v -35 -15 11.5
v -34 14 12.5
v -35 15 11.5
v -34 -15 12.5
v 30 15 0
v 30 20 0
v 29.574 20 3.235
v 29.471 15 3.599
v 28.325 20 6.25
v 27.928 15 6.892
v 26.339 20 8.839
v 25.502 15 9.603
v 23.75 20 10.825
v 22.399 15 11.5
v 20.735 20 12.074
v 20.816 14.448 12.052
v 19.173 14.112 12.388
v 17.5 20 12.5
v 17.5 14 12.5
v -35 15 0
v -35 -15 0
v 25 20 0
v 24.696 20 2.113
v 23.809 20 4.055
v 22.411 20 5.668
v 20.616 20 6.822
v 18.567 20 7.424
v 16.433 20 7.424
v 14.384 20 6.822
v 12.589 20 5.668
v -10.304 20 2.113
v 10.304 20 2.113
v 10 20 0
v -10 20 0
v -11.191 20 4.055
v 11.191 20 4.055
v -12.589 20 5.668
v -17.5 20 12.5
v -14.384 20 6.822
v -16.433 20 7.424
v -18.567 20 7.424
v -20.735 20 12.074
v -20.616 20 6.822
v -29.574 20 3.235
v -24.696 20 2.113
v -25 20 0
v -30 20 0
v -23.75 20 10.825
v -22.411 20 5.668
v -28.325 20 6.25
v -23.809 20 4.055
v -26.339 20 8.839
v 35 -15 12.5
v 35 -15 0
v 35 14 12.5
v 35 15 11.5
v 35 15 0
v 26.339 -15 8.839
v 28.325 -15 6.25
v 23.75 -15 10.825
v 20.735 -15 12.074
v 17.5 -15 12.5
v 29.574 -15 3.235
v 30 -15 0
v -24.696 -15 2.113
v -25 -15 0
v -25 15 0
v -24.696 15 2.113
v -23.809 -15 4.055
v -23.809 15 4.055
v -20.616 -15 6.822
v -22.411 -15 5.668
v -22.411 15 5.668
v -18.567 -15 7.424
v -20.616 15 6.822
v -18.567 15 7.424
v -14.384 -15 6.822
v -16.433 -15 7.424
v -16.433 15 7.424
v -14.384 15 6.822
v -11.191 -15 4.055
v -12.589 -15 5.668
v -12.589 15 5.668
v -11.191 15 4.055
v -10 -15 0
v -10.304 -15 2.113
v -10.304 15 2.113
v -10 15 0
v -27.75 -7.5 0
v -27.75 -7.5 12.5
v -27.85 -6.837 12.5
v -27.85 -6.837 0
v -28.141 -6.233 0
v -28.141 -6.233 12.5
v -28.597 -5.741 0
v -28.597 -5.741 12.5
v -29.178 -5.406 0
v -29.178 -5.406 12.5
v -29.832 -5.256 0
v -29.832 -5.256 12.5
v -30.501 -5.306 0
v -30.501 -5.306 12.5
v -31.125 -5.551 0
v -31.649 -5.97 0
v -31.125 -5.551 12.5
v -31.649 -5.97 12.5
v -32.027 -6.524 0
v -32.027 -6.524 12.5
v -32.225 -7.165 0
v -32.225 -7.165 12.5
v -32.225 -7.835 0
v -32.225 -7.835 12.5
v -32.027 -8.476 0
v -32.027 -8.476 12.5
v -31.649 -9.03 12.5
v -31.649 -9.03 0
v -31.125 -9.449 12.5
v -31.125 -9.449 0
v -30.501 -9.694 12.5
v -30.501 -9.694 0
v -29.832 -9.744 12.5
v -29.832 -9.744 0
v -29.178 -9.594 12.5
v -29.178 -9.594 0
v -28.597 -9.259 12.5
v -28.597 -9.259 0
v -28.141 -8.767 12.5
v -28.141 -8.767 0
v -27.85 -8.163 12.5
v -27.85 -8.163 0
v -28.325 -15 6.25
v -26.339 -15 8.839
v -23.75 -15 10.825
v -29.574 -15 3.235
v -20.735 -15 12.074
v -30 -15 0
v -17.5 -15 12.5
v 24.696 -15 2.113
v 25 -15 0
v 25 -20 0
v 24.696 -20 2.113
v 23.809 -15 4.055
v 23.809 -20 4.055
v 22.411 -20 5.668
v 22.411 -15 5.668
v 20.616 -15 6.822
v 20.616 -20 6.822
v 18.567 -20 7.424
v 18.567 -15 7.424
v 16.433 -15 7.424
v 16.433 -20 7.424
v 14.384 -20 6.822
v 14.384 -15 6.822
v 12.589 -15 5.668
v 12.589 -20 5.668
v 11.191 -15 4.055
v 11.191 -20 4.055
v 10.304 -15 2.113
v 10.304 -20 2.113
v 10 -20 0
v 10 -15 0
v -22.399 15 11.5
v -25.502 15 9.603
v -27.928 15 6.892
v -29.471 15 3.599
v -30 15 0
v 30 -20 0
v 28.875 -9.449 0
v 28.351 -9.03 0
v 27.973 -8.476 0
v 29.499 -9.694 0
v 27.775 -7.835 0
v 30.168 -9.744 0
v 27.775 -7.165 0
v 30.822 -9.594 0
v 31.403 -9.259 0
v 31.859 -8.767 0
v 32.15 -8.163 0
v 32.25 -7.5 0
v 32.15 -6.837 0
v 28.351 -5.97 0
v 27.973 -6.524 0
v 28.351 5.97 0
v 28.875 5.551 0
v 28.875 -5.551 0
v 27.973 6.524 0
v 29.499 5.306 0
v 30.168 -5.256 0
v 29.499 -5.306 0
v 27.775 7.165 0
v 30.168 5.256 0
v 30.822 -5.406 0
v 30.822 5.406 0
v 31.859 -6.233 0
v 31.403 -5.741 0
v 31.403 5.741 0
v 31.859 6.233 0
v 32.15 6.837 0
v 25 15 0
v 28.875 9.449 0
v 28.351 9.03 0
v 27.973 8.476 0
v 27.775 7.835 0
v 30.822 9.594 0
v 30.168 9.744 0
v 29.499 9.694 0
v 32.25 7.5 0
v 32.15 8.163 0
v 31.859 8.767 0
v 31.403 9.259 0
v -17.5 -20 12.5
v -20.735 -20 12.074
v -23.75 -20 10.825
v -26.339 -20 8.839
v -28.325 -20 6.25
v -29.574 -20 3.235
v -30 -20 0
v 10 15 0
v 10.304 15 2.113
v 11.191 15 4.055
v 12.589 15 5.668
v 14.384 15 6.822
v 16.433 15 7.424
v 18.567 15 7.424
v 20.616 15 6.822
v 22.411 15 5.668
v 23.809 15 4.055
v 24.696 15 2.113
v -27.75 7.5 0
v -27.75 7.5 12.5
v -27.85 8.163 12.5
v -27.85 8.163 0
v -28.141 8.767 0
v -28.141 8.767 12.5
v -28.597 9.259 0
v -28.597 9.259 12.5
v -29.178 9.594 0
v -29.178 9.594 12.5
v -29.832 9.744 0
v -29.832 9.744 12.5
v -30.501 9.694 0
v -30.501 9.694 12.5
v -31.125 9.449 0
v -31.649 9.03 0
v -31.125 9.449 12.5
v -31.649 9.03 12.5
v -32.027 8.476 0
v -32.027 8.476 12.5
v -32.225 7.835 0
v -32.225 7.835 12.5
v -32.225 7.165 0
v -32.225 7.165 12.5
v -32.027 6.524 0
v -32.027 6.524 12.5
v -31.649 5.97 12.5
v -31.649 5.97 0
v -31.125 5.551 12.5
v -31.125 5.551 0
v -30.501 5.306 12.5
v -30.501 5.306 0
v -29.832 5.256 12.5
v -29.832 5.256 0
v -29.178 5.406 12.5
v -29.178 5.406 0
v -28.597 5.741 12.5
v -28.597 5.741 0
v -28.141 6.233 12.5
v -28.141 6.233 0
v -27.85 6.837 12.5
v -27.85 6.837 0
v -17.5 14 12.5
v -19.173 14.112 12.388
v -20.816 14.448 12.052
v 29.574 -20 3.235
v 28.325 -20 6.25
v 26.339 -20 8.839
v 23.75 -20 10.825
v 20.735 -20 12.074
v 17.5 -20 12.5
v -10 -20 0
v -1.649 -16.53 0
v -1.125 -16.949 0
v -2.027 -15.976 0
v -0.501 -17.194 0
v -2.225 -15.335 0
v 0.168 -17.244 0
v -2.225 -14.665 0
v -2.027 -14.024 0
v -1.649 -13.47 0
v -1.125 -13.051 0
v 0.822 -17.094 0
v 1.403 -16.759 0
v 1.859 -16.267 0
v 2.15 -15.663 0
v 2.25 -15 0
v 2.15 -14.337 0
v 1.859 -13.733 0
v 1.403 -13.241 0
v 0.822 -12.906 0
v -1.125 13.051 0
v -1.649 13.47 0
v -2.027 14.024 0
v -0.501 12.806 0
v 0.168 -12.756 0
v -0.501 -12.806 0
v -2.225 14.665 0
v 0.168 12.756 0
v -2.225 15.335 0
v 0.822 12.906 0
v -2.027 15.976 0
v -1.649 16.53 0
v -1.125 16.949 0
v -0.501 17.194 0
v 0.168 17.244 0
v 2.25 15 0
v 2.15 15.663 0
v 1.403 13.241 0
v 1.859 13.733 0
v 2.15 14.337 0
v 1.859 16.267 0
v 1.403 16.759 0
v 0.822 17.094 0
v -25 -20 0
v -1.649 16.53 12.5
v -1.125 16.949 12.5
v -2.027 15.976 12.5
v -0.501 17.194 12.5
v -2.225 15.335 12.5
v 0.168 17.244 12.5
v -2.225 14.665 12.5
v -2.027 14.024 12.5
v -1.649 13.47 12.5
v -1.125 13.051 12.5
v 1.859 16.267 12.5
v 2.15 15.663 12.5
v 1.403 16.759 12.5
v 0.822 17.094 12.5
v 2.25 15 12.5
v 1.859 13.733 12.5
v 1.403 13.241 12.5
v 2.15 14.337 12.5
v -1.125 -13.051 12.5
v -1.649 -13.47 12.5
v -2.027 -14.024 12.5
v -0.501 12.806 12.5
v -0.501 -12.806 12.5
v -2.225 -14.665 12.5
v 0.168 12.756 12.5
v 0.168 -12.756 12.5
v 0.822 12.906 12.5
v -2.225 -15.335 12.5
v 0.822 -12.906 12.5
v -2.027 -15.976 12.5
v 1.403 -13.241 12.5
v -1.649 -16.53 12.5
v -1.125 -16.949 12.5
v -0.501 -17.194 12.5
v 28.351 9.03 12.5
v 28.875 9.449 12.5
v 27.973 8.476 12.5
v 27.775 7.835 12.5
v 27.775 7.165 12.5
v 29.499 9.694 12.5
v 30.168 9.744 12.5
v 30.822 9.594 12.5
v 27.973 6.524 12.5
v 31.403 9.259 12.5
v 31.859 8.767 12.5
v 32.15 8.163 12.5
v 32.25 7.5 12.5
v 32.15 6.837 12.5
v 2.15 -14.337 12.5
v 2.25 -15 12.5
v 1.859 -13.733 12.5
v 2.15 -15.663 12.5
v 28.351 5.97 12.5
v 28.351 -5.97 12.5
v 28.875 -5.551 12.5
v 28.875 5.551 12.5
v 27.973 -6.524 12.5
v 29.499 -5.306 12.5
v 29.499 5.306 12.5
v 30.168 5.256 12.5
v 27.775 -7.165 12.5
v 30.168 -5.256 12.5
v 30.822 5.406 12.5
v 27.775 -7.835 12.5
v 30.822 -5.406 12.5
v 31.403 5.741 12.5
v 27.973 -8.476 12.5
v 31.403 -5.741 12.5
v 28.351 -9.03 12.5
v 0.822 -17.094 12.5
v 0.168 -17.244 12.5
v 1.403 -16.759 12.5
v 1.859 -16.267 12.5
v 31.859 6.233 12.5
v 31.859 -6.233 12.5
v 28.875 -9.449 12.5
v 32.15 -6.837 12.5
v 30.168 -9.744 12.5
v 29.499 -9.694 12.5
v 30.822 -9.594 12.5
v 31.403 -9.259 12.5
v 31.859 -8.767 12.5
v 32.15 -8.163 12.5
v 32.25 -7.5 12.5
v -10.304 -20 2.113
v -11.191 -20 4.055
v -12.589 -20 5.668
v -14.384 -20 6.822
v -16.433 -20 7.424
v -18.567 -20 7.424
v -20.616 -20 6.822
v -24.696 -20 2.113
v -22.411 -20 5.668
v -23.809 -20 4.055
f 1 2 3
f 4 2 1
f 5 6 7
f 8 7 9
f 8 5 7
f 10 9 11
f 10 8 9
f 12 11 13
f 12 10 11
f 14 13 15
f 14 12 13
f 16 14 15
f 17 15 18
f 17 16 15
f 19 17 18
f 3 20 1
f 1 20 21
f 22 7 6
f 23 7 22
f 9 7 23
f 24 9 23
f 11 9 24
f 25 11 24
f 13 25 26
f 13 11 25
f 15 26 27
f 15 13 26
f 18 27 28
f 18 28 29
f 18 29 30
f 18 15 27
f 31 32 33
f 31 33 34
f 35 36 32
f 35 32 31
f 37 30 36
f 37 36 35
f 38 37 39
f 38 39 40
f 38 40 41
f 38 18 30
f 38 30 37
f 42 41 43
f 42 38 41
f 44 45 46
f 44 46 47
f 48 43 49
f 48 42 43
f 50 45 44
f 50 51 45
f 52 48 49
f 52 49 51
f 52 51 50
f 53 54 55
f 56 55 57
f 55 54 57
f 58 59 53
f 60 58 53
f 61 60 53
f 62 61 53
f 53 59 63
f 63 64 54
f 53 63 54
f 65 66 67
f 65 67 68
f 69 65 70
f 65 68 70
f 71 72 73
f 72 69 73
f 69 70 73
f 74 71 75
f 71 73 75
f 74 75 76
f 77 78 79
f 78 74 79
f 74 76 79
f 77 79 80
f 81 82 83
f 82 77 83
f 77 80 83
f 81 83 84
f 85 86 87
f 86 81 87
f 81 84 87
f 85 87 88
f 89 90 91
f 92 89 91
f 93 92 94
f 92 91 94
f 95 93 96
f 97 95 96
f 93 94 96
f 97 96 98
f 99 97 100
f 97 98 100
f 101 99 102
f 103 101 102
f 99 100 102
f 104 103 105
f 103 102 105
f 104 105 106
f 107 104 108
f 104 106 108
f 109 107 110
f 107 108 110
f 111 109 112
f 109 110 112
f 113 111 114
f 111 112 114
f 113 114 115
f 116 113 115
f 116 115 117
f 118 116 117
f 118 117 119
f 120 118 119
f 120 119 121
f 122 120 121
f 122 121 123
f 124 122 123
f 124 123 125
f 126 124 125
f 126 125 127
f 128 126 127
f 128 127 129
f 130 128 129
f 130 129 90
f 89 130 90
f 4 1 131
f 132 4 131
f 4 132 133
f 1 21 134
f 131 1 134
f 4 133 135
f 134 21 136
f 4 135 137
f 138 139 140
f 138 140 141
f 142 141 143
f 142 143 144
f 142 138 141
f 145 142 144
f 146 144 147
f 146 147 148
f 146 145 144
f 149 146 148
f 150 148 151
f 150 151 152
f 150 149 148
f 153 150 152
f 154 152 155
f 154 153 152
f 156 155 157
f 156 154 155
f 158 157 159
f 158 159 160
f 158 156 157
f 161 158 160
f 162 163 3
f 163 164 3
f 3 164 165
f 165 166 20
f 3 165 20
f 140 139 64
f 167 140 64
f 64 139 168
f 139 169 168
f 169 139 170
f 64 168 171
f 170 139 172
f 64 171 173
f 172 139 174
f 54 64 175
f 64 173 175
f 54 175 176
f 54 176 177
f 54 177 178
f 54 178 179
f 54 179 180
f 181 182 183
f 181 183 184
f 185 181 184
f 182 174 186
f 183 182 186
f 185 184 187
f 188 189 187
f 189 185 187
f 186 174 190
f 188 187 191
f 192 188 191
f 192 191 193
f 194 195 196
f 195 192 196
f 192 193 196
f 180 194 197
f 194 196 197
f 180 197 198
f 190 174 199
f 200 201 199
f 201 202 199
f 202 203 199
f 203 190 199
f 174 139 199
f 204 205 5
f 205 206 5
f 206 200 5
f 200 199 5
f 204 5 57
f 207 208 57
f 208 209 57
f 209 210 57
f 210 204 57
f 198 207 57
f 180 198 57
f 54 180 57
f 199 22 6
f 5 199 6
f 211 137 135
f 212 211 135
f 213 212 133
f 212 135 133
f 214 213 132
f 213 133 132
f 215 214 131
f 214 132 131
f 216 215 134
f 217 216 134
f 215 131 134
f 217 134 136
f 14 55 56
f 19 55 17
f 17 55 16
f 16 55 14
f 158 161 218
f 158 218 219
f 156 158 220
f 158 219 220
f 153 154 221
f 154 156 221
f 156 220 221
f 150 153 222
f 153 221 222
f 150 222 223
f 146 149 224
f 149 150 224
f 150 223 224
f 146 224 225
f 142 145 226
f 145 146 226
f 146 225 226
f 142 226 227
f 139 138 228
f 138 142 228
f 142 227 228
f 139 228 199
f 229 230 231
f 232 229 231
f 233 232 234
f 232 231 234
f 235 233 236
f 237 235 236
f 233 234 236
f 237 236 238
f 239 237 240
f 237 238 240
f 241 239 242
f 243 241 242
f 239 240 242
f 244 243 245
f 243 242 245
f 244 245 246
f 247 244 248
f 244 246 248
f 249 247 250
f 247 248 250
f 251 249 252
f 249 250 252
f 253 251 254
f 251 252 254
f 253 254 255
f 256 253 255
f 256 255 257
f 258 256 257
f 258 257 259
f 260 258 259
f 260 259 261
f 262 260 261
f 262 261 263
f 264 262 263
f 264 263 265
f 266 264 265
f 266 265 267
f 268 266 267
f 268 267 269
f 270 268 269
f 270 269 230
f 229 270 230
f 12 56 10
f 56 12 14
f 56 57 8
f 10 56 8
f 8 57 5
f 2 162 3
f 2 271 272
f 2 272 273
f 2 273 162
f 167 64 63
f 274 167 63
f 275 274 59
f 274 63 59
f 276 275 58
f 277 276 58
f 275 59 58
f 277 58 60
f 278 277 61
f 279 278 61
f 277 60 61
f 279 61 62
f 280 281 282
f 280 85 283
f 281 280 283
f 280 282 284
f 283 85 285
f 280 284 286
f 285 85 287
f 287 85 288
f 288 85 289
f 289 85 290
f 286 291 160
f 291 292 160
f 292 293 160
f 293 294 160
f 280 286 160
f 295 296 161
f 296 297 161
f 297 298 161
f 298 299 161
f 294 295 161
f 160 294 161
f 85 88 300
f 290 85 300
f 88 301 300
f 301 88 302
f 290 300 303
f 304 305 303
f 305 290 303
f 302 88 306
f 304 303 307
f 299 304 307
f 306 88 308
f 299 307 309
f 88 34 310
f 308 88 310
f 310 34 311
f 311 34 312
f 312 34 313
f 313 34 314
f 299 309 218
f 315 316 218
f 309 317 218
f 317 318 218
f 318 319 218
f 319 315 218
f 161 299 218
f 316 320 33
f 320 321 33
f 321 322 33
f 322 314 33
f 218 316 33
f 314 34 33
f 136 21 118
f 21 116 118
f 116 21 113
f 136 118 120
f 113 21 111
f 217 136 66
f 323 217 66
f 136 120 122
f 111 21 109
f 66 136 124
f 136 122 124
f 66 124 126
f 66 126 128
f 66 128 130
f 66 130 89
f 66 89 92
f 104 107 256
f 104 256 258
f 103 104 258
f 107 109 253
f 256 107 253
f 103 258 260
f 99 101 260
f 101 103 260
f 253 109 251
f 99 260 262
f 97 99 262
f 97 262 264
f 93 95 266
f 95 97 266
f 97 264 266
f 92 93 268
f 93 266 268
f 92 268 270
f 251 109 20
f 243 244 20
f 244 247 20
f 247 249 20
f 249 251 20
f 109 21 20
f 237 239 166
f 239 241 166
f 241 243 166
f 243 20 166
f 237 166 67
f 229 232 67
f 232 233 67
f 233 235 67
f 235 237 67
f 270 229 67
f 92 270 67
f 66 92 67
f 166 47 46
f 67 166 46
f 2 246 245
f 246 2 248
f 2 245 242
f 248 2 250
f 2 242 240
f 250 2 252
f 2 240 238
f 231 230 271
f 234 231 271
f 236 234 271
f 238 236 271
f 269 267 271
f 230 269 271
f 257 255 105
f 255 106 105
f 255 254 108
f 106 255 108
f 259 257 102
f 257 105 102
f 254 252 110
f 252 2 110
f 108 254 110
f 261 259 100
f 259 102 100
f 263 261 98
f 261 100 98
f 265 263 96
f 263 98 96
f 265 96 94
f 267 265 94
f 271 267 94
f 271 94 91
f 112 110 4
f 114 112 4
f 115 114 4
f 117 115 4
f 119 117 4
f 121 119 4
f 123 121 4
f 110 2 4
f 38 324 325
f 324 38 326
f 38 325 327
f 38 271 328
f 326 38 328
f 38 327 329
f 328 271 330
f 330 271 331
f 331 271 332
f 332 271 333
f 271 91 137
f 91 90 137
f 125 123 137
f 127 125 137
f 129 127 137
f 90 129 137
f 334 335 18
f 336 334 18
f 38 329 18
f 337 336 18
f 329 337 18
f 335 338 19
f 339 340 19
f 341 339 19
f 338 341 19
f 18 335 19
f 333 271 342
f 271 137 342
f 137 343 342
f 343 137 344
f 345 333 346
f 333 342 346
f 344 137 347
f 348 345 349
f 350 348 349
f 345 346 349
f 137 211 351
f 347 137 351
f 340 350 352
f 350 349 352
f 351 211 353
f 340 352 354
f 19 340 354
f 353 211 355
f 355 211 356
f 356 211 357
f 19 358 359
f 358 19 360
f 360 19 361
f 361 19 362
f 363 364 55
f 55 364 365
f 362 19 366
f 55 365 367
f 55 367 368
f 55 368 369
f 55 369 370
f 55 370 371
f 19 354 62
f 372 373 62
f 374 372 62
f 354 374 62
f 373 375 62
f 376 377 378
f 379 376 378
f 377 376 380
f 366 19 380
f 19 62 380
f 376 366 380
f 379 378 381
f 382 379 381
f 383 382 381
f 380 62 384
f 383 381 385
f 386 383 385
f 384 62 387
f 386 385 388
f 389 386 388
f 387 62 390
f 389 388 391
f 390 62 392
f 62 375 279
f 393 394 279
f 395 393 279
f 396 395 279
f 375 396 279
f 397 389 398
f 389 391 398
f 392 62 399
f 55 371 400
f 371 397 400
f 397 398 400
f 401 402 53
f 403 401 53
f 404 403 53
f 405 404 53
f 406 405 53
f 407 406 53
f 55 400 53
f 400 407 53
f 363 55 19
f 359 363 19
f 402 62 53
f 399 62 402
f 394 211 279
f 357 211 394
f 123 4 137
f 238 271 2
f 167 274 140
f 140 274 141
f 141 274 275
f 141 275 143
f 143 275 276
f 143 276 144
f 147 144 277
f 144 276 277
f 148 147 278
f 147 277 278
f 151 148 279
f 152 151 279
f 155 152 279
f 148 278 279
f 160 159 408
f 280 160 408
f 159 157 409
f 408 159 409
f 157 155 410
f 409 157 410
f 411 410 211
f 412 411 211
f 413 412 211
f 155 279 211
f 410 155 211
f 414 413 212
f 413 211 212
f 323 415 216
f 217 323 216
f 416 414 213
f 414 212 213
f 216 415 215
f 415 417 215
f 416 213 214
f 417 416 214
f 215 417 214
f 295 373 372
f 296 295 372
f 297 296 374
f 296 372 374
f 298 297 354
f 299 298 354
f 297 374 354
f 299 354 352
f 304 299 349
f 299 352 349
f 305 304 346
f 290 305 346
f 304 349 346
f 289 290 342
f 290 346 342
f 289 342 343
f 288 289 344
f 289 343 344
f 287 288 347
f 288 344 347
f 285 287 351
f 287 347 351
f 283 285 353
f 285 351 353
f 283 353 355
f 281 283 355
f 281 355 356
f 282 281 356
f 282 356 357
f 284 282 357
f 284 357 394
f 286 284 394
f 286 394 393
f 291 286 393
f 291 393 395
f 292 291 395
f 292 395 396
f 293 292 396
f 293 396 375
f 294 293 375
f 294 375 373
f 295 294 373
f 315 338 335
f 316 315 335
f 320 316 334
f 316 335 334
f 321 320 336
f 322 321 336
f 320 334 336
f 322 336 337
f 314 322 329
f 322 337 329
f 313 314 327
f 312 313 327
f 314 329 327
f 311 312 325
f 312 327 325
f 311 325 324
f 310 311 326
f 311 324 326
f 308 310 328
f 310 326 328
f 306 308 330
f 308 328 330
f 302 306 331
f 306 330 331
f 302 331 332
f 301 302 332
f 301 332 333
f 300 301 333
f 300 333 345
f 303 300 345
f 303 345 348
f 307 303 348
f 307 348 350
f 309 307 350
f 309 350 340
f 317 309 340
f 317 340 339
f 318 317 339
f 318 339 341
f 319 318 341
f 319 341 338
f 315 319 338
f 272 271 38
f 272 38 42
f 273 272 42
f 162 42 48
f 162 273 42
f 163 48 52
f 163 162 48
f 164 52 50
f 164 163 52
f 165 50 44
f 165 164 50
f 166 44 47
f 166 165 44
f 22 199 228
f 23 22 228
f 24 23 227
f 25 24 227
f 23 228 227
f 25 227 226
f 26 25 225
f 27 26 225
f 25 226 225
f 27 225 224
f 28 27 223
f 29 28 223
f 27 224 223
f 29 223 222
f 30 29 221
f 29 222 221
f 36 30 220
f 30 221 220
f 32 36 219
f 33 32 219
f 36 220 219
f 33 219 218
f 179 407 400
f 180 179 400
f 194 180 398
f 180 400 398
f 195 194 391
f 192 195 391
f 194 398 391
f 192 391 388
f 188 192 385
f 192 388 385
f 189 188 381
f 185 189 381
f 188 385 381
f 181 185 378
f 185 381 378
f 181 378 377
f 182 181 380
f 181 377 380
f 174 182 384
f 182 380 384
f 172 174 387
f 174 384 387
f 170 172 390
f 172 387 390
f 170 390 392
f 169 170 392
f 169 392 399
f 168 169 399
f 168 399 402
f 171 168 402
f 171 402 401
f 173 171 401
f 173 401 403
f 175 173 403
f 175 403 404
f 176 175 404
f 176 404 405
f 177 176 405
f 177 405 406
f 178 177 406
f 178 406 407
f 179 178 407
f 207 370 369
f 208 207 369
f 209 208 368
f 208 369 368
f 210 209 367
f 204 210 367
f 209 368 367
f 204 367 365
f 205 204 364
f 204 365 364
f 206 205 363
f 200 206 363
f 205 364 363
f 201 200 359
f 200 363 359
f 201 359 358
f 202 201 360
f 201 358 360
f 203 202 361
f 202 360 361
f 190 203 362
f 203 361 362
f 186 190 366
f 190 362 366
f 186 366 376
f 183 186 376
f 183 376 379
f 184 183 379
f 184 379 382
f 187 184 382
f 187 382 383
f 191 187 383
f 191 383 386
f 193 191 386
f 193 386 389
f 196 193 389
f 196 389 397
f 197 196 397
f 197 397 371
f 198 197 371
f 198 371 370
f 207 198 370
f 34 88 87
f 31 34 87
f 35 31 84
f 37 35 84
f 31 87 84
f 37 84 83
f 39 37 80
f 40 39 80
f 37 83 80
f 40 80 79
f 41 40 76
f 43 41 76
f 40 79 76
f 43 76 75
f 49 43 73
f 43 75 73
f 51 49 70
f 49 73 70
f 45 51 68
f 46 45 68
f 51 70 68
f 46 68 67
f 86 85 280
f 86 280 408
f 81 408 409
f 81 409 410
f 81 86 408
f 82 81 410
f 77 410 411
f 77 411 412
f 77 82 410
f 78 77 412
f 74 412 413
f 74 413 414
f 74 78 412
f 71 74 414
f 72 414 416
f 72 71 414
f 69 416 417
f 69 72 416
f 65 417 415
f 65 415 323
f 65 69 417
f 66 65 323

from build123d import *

# Parameters (mm, degrees)
PAD_DEPTH         = 12.5
CHAMFER_SIZE      = 1
PAD001_DEPTH      = 5
PAD001_DEPTH_BACK = 35
SKETCH002_R       = 7.5
POCKET_DEPTH      = 35.001
SKETCH003_R       = 2.25
POCKET001_DEPTH   = 12.501


with BuildPart() as part:
    # Sketch → Pad (new body)
    with BuildSketch(Plane.XY):
        Polygon((-35, 15), (-35, -15), (-30, -15), (30, -15), (35, -15), (35, 15), (30, 15), (-30, 15), align=None)
    extrude(amount=PAD_DEPTH)

    # Chamfer
    chamfer_edges = [part.edges().sort_by_distance(p)[0] for p in [
        (0, 15, 12.5),
        (-35, 0, 12.5),
    ]]
    chamfer(chamfer_edges, length=CHAMFER_SIZE)

    # Sketch001 → Pad001 (new body, two sides)
    with BuildSketch(Plane.XZ.offset(15)) as pad001_sk:
        with BuildLine():
            ThreePointArc((-10, 0), (-17.5, 7.5), (-25, 0))
            Line((-25, 0), (-30, 0))
            ThreePointArc((-17.499993, 12.5), (-26.338832, 8.838837), (-30, 0))
            Line((-17.499993, 12.5), (17.500032, 12.5))
            ThreePointArc((30, 0), (26.338846, 8.838823), (17.500032, 12.5))
            Line((25, 0), (30, 0))
            ThreePointArc((25, 0), (17.5, 7.5), (10, 0))
            Line((10, 0), (-10, 0))
        make_face()
    extrude(amount=PAD001_DEPTH)
    extrude(pad001_sk.sketch, amount=-PAD001_DEPTH_BACK)

    # Sketch002 → Pocket (cut, through all)
    with BuildSketch(Plane(origin=(0, 15, 0), x_dir=(-1, 0, 0), z_dir=(0, 1, 0))):
        with Locations((-17.5, 0)):
            Circle(SKETCH002_R)
        with Locations((17.5, 0)):
            Circle(SKETCH002_R)
    extrude(amount=-POCKET_DEPTH, mode=Mode.SUBTRACT)

    # Sketch003 → Pocket001 (cut, through all)
    with BuildSketch(Plane.XY.offset(12.5)):
        with Locations((0, 15)):
            Circle(SKETCH003_R)
        with Locations((0, -15)):
            Circle(SKETCH003_R)
        with Locations((-30, 7.5)):
            Circle(SKETCH003_R)
        with Locations((-30, -7.5)):
            Circle(SKETCH003_R)
        with Locations((30, 7.5)):
            Circle(SKETCH003_R)
        with Locations((30, -7.5)):
            Circle(SKETCH003_R)
    extrude(amount=-POCKET001_DEPTH, mode=Mode.SUBTRACT)


solid = part.part
